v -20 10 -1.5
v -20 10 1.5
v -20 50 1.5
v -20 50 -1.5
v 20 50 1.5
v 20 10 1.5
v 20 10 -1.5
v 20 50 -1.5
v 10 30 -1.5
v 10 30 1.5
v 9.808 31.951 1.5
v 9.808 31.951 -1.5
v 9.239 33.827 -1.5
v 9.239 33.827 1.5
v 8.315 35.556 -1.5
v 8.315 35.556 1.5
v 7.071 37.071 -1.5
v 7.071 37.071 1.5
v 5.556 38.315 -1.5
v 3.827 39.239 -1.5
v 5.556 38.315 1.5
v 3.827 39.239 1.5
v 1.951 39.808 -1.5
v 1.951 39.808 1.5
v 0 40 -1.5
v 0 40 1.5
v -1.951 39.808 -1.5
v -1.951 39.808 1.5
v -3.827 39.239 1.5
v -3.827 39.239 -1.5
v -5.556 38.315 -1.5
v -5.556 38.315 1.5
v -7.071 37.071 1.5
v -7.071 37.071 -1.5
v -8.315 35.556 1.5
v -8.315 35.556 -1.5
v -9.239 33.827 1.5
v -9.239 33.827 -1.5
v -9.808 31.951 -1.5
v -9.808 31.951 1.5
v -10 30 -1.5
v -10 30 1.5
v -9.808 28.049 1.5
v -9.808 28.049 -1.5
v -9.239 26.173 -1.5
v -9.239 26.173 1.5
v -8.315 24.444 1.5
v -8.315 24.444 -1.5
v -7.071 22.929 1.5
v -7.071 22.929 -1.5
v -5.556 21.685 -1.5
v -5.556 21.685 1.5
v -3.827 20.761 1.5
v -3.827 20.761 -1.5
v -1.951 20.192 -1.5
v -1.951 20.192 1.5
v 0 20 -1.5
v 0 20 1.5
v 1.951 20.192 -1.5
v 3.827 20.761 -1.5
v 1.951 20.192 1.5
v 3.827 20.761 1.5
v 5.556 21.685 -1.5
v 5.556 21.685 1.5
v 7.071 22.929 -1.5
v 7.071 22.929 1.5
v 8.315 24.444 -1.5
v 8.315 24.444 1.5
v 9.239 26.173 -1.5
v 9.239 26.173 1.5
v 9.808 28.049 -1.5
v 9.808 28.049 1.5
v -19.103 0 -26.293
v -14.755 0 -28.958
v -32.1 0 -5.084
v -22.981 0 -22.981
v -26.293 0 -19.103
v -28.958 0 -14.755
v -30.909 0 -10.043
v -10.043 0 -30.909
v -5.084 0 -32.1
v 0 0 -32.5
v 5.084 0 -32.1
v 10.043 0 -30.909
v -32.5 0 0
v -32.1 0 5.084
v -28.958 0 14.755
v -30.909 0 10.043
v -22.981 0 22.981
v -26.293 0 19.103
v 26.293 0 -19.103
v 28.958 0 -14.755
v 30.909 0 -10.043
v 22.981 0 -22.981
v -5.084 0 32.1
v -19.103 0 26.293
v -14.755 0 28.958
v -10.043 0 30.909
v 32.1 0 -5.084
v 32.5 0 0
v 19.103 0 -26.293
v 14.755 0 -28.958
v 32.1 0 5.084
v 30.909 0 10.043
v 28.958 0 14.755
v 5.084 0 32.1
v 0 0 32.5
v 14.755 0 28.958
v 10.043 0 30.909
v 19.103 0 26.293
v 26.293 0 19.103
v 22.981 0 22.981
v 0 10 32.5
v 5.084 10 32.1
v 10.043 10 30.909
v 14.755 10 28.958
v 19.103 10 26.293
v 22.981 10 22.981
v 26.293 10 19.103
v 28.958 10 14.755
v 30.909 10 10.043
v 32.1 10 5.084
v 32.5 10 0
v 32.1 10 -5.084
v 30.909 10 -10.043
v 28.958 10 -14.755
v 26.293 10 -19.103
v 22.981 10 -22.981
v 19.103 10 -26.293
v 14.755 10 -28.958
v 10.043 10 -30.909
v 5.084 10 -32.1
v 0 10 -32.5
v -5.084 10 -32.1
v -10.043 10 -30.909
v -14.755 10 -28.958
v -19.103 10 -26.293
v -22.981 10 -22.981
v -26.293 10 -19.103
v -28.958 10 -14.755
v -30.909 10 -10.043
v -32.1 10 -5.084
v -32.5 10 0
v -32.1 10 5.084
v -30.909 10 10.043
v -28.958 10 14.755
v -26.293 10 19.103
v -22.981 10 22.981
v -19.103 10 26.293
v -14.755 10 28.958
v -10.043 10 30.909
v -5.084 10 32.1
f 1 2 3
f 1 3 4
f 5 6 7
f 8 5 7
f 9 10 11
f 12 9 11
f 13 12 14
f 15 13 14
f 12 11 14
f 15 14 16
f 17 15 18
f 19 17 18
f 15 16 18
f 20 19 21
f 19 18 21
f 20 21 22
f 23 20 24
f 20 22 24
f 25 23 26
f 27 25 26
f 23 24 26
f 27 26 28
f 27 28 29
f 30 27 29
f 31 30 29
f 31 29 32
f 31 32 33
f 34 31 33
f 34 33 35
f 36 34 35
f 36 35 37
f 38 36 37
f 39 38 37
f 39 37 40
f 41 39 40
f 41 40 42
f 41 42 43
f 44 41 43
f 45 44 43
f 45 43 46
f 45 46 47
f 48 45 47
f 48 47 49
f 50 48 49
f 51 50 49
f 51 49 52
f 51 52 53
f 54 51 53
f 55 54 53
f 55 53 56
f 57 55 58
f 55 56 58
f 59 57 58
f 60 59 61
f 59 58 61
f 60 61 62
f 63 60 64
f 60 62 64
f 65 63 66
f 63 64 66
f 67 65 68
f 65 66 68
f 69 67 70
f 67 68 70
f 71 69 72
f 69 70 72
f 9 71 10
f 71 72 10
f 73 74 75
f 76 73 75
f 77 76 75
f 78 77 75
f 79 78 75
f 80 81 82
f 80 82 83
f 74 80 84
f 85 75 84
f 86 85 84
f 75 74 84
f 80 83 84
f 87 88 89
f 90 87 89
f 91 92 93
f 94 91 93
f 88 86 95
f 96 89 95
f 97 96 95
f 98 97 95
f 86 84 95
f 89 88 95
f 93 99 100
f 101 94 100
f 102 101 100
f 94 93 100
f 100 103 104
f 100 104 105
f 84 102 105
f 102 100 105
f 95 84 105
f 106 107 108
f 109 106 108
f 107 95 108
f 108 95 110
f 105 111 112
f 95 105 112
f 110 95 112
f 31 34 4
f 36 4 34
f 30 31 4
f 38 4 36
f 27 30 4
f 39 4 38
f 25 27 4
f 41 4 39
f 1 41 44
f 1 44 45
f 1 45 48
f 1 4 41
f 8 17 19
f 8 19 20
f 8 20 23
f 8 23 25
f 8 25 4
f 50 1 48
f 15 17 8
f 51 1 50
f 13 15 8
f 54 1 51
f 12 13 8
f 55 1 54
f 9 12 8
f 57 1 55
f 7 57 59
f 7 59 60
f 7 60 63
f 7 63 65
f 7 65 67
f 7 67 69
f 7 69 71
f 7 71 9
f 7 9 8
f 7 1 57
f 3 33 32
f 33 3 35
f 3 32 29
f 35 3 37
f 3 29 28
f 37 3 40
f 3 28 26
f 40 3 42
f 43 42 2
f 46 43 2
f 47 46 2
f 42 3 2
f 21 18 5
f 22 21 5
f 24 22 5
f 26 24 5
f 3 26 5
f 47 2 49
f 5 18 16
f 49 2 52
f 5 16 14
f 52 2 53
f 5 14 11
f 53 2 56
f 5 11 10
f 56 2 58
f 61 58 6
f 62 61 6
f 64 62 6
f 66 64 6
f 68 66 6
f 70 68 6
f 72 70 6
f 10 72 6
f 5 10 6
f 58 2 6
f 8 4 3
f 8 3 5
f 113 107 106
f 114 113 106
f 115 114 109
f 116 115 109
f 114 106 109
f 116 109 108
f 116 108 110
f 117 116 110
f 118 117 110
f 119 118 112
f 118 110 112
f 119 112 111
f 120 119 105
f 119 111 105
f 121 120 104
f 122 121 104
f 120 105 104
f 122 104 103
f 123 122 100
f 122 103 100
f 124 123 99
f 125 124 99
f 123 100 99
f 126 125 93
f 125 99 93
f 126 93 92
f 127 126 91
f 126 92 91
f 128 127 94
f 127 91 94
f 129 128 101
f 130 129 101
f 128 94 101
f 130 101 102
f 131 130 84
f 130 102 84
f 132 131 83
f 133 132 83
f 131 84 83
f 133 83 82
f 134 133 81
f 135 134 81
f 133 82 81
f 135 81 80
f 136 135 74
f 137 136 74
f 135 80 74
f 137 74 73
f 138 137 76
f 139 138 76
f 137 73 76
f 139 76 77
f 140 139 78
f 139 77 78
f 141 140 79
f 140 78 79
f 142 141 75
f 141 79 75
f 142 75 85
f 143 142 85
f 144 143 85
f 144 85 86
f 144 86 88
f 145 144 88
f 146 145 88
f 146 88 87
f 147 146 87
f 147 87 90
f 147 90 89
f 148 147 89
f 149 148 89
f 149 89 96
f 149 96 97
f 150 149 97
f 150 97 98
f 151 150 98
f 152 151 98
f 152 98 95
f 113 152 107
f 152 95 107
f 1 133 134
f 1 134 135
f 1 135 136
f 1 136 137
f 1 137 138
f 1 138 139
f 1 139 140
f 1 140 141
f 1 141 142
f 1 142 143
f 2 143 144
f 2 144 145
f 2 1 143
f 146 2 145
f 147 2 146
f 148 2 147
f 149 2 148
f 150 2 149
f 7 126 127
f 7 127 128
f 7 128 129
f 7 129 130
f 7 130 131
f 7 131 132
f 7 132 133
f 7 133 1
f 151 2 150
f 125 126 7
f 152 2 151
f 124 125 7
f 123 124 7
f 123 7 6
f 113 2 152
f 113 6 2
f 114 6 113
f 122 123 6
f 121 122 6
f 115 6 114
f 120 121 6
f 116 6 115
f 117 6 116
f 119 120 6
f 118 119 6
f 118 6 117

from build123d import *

# Parameters (mm, degrees)
SKETCH1_R           = 32.5
BOSS_EXTRUDE1_DEPTH = 10
SKETCH4_W           = 40
SKETCH4_H           = 3
BOSS_EXTRUDE3_DEPTH = 40
SKETCH5_R           = 10
CUT_EXTRUDE2_DEPTH  = 40


with BuildPart() as part:
    # Sketch1 → Boss-Extrude1 (new body)
    with BuildSketch(Plane(origin=(0, 0, 0), x_dir=(1, 0, 0), z_dir=(0, 1, 0))):
        with Locations(Location((0, 0, 0), (0, 0, 270))):
            Circle(SKETCH1_R)
    extrude(amount=BOSS_EXTRUDE1_DEPTH)

    # Sketch4 → Boss-Extrude3 (add)
    with BuildSketch(Plane(origin=(0, 10, 0), x_dir=(1, 0, 0), z_dir=(0, 1, 0))):
        Rectangle(SKETCH4_W, SKETCH4_H)
    extrude(amount=BOSS_EXTRUDE3_DEPTH)

    # Sketch5 → Cut-Extrude2 (cut)
    with BuildSketch(Plane.XY.offset(1.5)):
        with Locations((0, 30)):
            Circle(SKETCH5_R)
    extrude(amount=-CUT_EXTRUDE2_DEPTH, mode=Mode.SUBTRACT)


solid = part.part
